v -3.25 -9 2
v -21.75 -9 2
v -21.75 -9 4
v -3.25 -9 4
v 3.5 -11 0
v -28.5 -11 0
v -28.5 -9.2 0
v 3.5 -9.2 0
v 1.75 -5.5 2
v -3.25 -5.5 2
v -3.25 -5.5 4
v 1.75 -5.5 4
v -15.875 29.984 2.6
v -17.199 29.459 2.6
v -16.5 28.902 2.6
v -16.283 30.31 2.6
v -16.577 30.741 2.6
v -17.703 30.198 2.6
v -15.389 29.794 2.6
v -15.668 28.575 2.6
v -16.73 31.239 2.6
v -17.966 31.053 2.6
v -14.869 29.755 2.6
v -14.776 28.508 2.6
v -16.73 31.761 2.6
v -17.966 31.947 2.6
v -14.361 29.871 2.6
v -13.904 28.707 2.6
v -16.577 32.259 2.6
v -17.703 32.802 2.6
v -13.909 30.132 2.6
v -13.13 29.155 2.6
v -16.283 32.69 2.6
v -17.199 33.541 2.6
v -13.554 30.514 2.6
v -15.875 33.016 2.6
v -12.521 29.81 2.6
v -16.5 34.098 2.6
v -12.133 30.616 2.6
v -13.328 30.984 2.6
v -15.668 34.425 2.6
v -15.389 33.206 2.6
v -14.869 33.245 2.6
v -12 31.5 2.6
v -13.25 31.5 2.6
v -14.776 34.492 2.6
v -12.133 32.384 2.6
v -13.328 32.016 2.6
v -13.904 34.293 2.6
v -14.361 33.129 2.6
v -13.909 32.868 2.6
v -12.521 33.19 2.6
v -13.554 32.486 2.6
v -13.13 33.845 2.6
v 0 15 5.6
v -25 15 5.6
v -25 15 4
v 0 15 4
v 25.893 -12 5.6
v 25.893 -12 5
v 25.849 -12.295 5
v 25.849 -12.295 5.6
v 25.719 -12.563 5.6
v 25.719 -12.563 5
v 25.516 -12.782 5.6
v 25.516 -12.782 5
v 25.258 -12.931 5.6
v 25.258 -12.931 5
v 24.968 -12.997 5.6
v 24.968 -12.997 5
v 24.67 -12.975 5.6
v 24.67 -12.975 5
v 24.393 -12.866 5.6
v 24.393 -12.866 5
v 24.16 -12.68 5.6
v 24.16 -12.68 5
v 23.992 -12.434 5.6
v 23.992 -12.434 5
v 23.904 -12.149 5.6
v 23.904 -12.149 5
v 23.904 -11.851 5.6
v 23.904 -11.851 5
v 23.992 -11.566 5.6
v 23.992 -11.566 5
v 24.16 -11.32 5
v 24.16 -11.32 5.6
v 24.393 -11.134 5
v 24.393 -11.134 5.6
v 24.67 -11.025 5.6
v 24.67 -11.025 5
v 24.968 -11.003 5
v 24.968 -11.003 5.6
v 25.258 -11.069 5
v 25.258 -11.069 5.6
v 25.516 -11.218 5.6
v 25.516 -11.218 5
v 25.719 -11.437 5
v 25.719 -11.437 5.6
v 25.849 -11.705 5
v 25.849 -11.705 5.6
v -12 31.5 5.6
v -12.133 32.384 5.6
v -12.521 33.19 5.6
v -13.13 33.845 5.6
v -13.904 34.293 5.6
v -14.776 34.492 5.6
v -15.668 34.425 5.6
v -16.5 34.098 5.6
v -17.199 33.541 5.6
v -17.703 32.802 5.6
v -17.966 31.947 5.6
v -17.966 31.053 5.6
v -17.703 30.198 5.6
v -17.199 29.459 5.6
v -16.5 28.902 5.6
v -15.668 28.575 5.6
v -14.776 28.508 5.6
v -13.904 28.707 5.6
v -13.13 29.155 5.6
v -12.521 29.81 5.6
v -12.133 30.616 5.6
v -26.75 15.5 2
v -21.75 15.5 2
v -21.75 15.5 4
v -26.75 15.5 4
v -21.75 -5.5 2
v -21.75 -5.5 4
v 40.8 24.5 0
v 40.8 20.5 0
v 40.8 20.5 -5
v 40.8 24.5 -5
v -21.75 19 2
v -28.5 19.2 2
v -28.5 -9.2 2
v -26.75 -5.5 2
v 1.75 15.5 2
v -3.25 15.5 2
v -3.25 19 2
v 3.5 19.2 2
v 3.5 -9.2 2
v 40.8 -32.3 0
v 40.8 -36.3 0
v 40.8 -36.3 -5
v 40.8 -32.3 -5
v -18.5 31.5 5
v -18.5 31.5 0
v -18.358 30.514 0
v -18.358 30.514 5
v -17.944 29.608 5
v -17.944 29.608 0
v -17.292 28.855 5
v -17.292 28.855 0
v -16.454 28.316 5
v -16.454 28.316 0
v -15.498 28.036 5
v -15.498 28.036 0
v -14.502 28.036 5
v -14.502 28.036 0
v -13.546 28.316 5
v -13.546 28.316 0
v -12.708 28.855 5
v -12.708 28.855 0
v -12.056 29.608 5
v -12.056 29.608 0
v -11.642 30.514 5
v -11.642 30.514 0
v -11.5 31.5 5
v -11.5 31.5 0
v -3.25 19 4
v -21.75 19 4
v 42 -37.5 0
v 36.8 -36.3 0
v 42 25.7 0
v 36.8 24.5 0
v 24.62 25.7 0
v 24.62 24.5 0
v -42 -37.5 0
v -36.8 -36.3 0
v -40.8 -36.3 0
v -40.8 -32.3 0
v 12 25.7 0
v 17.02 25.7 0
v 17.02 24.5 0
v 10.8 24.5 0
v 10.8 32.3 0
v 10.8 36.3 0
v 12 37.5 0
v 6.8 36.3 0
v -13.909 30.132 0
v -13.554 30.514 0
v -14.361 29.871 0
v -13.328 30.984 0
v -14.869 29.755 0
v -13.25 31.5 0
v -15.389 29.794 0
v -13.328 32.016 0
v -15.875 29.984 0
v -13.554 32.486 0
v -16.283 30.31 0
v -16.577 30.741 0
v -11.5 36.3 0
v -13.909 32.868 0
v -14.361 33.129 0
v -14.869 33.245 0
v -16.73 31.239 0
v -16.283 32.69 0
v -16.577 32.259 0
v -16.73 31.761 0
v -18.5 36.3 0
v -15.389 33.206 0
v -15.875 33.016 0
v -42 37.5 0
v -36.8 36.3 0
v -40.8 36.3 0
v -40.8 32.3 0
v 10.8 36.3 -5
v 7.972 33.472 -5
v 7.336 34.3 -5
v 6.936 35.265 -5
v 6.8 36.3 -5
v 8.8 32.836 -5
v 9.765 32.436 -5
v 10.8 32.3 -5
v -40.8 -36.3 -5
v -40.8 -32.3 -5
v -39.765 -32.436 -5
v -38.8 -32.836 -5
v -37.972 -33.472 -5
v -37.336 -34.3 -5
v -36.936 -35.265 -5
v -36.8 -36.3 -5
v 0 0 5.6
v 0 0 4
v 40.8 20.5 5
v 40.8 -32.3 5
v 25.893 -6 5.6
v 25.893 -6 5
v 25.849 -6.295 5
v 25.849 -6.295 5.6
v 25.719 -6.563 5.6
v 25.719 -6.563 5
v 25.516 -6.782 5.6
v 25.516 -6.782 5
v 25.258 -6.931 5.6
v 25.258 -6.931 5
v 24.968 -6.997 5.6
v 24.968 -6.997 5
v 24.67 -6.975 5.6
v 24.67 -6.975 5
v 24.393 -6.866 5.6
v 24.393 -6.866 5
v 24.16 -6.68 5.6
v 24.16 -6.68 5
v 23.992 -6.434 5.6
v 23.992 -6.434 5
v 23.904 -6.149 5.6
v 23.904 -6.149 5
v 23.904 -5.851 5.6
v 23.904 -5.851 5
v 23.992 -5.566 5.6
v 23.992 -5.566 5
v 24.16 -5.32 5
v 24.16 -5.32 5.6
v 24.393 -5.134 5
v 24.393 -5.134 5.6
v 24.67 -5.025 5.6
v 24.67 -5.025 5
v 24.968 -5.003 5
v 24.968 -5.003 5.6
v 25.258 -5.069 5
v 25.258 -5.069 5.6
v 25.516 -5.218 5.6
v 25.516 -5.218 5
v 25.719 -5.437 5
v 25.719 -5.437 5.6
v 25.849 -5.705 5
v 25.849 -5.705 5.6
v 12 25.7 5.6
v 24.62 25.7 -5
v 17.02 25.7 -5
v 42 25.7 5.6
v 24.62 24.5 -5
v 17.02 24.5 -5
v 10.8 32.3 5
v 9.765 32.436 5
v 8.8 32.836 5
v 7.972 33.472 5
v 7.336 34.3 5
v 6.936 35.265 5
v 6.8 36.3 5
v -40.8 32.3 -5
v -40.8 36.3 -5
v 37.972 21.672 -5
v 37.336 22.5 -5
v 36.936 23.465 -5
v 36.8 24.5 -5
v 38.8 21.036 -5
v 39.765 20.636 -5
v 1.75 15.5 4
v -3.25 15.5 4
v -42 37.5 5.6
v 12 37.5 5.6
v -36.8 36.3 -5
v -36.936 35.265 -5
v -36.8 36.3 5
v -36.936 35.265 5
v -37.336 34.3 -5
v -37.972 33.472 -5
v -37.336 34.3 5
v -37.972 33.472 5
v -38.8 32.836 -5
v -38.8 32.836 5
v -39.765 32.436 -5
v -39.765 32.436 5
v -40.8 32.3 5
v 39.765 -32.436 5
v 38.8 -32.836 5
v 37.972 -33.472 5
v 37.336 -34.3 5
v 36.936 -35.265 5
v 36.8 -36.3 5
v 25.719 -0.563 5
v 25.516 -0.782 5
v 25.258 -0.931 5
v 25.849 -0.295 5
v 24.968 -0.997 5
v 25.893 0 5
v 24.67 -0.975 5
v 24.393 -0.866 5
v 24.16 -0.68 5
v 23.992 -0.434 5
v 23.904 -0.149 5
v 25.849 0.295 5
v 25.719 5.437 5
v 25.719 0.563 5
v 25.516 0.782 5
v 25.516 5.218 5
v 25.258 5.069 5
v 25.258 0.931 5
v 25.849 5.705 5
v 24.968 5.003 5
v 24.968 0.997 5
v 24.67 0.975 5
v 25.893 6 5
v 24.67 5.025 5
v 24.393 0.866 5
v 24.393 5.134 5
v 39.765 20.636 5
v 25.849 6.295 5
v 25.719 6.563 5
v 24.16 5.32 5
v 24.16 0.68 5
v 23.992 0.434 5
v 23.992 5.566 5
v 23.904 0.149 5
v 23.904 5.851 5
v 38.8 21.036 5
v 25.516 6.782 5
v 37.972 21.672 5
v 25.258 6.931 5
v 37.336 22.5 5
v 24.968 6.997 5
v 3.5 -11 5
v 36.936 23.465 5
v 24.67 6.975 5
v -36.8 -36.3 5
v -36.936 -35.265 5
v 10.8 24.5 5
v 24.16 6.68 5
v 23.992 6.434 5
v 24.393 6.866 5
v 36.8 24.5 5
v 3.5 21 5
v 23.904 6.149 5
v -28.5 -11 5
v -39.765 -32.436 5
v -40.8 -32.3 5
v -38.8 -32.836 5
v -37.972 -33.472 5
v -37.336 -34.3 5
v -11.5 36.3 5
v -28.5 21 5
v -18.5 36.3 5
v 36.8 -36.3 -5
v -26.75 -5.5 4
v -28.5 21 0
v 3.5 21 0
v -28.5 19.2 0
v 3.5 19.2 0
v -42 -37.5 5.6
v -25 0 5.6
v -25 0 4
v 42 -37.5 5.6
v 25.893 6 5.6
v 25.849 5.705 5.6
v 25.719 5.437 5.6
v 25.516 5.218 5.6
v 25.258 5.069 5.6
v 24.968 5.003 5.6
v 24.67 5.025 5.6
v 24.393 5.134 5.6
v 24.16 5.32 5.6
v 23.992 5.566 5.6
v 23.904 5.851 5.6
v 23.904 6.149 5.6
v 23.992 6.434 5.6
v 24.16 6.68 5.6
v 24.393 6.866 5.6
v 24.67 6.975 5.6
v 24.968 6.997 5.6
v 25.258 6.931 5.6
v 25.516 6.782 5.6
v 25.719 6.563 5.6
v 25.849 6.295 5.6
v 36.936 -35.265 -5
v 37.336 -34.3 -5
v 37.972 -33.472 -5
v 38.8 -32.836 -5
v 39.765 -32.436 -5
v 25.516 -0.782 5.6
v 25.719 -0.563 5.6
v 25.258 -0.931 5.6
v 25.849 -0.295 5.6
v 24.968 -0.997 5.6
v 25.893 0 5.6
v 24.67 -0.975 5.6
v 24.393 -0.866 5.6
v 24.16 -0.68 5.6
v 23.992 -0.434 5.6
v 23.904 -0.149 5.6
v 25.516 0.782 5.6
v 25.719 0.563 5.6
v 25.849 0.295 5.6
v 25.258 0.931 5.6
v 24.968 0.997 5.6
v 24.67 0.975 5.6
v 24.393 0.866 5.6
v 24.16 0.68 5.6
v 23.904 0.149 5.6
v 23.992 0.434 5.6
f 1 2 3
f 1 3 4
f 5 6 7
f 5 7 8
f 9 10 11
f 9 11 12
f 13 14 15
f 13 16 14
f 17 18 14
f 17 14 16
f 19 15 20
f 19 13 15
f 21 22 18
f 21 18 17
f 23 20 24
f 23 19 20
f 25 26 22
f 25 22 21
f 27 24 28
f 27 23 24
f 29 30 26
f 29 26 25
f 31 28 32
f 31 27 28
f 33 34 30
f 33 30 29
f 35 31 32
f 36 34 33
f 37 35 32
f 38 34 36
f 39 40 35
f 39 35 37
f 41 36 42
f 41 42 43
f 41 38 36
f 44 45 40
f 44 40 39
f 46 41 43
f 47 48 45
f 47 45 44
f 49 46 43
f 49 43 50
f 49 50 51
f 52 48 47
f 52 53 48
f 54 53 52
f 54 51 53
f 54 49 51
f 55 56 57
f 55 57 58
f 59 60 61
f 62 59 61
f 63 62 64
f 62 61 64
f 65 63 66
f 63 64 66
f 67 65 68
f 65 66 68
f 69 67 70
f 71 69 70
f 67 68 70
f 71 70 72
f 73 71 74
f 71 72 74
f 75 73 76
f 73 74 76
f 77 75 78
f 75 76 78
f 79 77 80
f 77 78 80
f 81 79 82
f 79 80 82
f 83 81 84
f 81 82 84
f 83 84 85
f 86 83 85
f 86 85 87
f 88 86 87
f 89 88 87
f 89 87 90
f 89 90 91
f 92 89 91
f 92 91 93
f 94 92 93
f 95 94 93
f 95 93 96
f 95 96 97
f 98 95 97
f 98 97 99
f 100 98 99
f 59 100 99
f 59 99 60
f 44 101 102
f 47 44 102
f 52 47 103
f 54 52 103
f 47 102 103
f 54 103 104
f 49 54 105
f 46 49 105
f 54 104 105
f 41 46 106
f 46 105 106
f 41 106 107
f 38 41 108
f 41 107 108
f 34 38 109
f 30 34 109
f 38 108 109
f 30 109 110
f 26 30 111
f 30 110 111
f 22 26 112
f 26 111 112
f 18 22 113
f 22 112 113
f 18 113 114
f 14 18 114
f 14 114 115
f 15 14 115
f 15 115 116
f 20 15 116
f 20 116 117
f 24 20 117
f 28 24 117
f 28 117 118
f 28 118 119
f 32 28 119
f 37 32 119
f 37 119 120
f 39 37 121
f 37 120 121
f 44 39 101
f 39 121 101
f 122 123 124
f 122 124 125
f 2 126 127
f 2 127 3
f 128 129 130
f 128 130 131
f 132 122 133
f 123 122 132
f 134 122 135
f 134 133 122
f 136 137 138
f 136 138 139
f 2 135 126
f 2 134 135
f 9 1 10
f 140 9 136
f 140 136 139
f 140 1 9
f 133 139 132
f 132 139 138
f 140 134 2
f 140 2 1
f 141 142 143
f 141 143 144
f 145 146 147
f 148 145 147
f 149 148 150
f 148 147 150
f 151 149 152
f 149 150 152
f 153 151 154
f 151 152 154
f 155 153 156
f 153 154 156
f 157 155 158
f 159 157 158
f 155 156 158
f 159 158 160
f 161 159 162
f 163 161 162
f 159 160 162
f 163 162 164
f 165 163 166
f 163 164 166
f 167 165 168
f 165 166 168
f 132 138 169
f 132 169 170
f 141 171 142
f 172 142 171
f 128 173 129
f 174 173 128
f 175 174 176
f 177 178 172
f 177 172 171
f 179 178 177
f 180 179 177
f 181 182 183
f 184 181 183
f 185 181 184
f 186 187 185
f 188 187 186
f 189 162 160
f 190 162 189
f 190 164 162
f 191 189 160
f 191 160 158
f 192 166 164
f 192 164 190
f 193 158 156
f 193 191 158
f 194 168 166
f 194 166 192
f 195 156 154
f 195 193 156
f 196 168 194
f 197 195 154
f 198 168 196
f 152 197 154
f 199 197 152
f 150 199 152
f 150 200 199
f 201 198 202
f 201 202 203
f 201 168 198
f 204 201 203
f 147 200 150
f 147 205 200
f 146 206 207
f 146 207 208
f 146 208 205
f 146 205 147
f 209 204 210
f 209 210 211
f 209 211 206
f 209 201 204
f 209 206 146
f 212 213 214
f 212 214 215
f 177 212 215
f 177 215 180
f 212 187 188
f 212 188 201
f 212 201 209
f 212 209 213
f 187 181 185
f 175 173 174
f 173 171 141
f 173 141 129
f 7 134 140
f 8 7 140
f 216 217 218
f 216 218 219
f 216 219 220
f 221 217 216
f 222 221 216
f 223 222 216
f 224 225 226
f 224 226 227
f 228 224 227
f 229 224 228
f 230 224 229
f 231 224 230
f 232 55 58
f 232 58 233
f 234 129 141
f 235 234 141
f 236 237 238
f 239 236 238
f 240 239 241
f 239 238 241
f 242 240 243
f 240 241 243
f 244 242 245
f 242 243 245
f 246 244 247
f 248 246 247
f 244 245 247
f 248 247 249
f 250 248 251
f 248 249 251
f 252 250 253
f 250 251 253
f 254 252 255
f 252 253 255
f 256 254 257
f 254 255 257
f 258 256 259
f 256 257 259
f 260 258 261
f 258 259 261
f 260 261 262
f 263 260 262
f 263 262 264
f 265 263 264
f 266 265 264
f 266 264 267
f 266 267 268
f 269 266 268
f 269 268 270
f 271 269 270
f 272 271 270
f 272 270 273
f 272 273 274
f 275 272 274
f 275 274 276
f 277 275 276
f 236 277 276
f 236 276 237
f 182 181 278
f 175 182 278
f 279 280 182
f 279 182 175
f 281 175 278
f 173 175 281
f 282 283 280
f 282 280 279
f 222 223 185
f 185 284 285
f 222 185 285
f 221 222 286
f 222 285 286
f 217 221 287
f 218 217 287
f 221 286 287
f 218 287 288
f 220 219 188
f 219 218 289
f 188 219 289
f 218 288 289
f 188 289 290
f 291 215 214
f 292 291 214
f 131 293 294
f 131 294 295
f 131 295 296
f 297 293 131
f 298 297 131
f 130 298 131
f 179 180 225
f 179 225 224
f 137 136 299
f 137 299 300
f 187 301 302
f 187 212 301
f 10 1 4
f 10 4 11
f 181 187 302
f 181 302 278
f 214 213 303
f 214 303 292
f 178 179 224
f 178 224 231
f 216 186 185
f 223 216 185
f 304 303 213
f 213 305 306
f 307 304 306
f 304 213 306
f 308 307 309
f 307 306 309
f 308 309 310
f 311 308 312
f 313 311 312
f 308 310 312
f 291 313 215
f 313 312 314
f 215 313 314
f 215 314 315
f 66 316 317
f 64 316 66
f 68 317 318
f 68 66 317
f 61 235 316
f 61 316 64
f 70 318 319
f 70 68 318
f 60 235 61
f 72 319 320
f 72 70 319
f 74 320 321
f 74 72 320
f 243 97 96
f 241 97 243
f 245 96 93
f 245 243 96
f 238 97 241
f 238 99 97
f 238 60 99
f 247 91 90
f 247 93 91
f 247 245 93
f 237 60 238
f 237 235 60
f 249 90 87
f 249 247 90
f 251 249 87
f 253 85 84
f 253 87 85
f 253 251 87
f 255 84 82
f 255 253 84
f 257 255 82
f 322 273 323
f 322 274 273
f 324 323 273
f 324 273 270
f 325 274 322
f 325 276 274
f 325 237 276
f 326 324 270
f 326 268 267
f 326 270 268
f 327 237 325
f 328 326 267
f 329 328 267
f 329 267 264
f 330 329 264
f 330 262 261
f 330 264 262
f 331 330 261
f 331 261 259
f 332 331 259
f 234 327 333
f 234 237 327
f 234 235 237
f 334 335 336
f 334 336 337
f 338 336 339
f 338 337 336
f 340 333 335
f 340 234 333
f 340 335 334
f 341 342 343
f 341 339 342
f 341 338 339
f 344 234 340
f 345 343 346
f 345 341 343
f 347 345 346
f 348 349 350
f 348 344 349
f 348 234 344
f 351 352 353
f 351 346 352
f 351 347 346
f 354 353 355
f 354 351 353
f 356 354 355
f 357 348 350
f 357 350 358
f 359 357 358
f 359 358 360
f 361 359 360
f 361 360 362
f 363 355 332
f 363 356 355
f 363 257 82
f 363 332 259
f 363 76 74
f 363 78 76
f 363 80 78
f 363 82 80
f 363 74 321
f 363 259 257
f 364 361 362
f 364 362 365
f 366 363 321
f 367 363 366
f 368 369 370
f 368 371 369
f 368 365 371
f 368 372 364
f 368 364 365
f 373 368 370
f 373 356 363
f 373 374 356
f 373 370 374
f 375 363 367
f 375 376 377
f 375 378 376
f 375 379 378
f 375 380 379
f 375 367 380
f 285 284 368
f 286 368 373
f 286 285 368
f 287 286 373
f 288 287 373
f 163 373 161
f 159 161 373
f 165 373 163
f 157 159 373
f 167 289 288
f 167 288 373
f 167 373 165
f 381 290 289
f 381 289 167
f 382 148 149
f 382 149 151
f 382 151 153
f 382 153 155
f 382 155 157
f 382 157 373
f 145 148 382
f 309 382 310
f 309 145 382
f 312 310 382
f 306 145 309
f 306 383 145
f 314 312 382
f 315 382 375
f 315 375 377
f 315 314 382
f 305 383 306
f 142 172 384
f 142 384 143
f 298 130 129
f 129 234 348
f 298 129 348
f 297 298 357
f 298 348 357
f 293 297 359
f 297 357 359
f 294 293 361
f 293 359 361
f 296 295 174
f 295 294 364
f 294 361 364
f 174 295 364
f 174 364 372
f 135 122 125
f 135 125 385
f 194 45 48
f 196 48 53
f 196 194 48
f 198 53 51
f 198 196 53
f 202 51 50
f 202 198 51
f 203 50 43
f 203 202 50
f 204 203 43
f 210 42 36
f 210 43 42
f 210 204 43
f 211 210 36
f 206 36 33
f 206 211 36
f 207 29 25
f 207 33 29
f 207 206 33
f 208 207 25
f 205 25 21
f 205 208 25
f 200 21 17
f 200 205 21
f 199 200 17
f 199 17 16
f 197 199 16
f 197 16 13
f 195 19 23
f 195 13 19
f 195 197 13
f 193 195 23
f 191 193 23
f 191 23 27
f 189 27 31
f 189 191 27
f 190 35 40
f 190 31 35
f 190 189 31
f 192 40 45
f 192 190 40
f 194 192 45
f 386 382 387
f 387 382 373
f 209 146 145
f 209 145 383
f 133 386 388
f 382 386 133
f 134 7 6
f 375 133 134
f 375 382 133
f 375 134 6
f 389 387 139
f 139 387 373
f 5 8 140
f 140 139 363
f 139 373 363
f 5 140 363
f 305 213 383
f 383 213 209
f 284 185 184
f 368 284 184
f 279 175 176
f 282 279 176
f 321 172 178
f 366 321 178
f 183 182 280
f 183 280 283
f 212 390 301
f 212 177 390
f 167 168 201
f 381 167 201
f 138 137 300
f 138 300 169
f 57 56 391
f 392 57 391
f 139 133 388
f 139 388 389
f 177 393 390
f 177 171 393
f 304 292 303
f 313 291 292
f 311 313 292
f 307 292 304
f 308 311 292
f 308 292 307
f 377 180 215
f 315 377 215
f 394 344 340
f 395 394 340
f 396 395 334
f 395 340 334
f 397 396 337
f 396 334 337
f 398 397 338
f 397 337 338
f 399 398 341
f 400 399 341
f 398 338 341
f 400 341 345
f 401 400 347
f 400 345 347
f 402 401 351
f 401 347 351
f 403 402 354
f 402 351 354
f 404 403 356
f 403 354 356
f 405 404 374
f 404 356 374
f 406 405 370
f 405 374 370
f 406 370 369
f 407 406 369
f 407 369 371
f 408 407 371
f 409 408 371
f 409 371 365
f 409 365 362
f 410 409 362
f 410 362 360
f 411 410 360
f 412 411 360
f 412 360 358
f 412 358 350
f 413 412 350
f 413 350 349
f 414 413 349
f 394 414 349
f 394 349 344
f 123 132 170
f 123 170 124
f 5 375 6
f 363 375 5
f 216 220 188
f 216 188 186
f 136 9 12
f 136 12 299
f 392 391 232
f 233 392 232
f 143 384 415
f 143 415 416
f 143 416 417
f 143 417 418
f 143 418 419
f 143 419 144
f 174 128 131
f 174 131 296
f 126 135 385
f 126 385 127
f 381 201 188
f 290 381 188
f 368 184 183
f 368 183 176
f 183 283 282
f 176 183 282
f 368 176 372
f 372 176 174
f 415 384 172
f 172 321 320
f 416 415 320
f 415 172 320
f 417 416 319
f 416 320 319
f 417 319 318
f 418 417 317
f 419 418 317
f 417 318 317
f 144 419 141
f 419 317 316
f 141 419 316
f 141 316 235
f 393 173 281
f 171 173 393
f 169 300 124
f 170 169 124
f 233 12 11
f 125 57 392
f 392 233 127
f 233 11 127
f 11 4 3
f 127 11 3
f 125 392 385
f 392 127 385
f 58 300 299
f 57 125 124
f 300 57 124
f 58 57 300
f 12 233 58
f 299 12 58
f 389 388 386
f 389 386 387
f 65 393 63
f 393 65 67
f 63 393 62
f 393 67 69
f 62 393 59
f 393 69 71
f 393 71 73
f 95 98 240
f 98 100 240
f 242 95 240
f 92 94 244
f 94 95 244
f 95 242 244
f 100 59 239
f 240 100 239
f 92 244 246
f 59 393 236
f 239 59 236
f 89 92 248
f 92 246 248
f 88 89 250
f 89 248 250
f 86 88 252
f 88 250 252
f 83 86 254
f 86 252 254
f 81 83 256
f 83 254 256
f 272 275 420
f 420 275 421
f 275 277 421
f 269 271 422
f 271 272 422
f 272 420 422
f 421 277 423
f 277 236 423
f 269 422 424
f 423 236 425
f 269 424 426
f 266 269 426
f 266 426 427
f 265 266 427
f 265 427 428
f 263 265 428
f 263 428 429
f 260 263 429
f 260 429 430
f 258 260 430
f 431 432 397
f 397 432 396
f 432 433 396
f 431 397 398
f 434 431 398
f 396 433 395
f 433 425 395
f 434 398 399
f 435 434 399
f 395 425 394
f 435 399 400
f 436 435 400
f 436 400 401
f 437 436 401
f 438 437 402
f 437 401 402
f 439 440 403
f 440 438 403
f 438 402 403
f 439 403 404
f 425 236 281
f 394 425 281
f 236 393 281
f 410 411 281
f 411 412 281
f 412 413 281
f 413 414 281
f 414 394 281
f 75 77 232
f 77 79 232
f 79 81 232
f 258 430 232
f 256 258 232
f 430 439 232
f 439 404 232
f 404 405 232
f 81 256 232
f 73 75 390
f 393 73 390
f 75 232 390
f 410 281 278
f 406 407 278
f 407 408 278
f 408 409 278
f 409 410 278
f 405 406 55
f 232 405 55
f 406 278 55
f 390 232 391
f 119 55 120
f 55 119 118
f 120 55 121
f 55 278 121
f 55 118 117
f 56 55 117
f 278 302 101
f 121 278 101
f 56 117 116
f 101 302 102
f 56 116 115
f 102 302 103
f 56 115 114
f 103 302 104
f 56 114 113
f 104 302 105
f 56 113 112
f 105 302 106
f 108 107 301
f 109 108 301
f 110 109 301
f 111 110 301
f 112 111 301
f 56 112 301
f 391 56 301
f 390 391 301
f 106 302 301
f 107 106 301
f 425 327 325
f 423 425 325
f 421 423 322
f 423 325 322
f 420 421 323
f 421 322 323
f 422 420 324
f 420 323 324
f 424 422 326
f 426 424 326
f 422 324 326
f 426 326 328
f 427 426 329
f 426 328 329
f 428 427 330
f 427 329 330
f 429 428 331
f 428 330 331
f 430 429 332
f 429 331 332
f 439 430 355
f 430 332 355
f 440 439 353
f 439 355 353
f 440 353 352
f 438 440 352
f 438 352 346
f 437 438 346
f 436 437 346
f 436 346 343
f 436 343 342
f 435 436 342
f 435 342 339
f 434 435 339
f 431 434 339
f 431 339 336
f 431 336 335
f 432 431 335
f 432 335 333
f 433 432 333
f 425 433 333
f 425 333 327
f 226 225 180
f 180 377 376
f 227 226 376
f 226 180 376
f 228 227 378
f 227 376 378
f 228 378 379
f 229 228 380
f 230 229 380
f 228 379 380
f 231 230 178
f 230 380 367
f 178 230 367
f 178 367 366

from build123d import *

# Parameters (mm, degrees)
SKETCH058_R     = 1.75
PAD036_DEPTH    = 5
SKETCH059_R     = 1.75
PAD037_DEPTH    = 0.6
SKETCH060_R     = 3
POCKET018_DEPTH = 3
SKETCH064_W     = 25
SKETCH064_H     = 15
POCKET020_DEPTH = 5
SKETCH065_W     = 32
SKETCH065_H     = 32
SKETCH065_W_2   = 25
SKETCH065_H_2   = 15
PAD040_DEPTH    = 3
POCKET021_DEPTH = 2
SKETCH067_W     = 32
SKETCH067_H     = 1.8
PAD041_DEPTH    = 2
SKETCH069_W     = 7.6
SKETCH069_H     = 1.2
PAD042_DEPTH    = 5
SKETCH070_R     = 1
POCKET022_DEPTH = 0.601
PAD043_DEPTH    = 10


with BuildPart() as part:
    # Sketch058 → Pad036 (new body)
    with BuildSketch(Plane.XY):
        Polygon((-42, 37.5), (12, 37.5), (12, 25.7), (42, 25.7), (42, -37.5), (-42, -37.5), align=None)
        with Locations((-15, 31.5)):
            Circle(SKETCH058_R, mode=Mode.SUBTRACT)
        with BuildLine():
            ThreePointArc((-18.5, 31.5), (-15, 28), (-11.5, 31.5))
            Line((-11.5, 31.5), (-11.5, 36.3))
            Line((-11.5, 36.3), (10.8, 36.3))
            Line((10.8, 36.3), (10.8, 24.5))
            Line((10.8, 24.5), (40.8, 24.5))
            Line((40.8, 24.5), (40.8, -36.3))
            Line((40.8, -36.3), (-40.8, -36.3))
            Line((-40.8, -36.3), (-40.8, 36.3))
            Line((-40.8, 36.3), (-18.5, 36.3))
            Line((-18.5, 31.5), (-18.5, 36.3))
        make_face(mode=Mode.SUBTRACT)
    extrude(amount=PAD036_DEPTH)

    # Sketch059 (on Face19 of Pad036) → Pad037 (join)
    with BuildSketch(Plane.XY.offset(5)):
        Polygon((-42, 37.5), (12, 37.5), (12, 25.7), (42, 25.7), (42, -37.5), (-42, -37.5), align=None)
        with Locations((-15, 31.5)):
            Circle(SKETCH059_R, mode=Mode.SUBTRACT)
    extrude(amount=PAD037_DEPTH)

    # Sketch060 (on Face1 of Pad037) → Pocket018 (cut)
    with BuildSketch(Plane.XY.offset(5.6)):
        with Locations((-15, 31.5)):
            Circle(SKETCH060_R)
    extrude(amount=-POCKET018_DEPTH, mode=Mode.SUBTRACT)

    # Sketch064 → Pocket020 (cut)
    with BuildSketch(Plane(origin=(0, 0, 5), x_dir=(1, 0, 0), z_dir=(0, 0, -1))):
        with Locations((-12.5, -7.5)):
            Rectangle(SKETCH064_W, SKETCH064_H)
    extrude(amount=-POCKET020_DEPTH, mode=Mode.SUBTRACT)

    # Sketch065 (on Face14 of Pocket020) → Pad040 (join)
    with BuildSketch(Plane(origin=(0, 0, 5), x_dir=(1, 0, 0), z_dir=(0, 0, -1))):
        with Locations((-12.5, -5)):
            Rectangle(SKETCH065_W, SKETCH065_H)
        with Locations((-12.5, -7.5)):
            Rectangle(SKETCH065_W_2, SKETCH065_H_2, mode=Mode.SUBTRACT)
    extrude(amount=PAD040_DEPTH)

    # Sketch066 (on Face24 of Pad040) → Pocket021 (cut)
    with BuildSketch(Plane(origin=(0, 0, 2), x_dir=(1, 0, 0), z_dir=(0, 0, -1))):
        Polygon((-26.75, -15.5), (-26.75, 5.5), (-21.75, 5.5), (-21.75, 9), (-3.25, 9), (-3.25, 5.5), (1.75, 5.5), (1.75, -15.5), (-3.25, -15.5), (-3.25, -19), (-21.75, -19), (-21.75, -15.5), align=None)
    extrude(amount=-POCKET021_DEPTH, mode=Mode.SUBTRACT)

    # Sketch067 (on Face40 of Pocket021) → Pad041 (join)
    with BuildSketch(Plane(origin=(0, 0, 2), x_dir=(1, 0, 0), z_dir=(0, 0, -1))):
        with Locations((-12.5, 10.1)):
            Rectangle(SKETCH067_W, SKETCH067_H)
        with Locations((-12.5, -20.1)):
            Rectangle(SKETCH067_W, SKETCH067_H)
    extrude(amount=PAD041_DEPTH)

    # Sketch069 (on Face13 of Pad041) → Pad042 (join)
    with BuildSketch(Plane(origin=(0, 0, 0), x_dir=(1, 0, 0), z_dir=(0, 0, -1))):
        with Locations((20.82, -25.1)):
            Rectangle(SKETCH069_W, SKETCH069_H)
    extrude(amount=PAD042_DEPTH)

    # Sketch070 (on Face40 of Pad042) → Pocket022 (cut, through all)
    with BuildSketch(Plane(origin=(0, 0, 5), x_dir=(1, 0, 0), z_dir=(0, 0, -1))):
        with Locations((24.892975, 0)):
            Circle(SKETCH070_R)
        with Locations((24.892975, -6)):
            Circle(SKETCH070_R)
        with Locations((24.892975, 6)):
            Circle(SKETCH070_R)
        with Locations((24.892975, 12)):
            Circle(SKETCH070_R)
    extrude(amount=-POCKET022_DEPTH, mode=Mode.SUBTRACT)

    # Sketch071 (on Face22 of Pocket022) → Pad043 (join)
    with BuildSketch(Plane(origin=(0, 0, 5), x_dir=(1, 0, 0), z_dir=(0, 0, -1))):
        with BuildLine():
            ThreePointArc((10.8, -32.3), (7.971573, -33.471573), (6.8, -36.3))
            Line((6.8, -36.3), (10.8, -36.3))
            Line((10.8, -36.3), (10.8, -32.3))
        make_face()
        with BuildLine():
            ThreePointArc((40.8, -20.5), (37.971573, -21.671573), (36.8, -24.5))
            Line((40.8, -24.5), (36.8, -24.5))
            Line((40.8, -20.5), (40.8, -24.5))
        make_face()
        with BuildLine():
            ThreePointArc((36.8, 36.3), (37.971573, 33.471573), (40.8, 32.3))
            Line((40.8, 36.3), (40.8, 32.3))
            Line((36.8, 36.3), (40.8, 36.3))
        make_face()
        with BuildLine():
            ThreePointArc((-40.8, 32.3), (-37.971573, 33.471573), (-36.8, 36.3))
            Line((-40.8, 36.3), (-36.8, 36.3))
            Line((-40.8, 32.3), (-40.8, 36.3))
        make_face()
        with BuildLine():
            ThreePointArc((-36.8, -36.3), (-37.971573, -33.471573), (-40.8, -32.3))
            Line((-40.8, -32.3), (-40.8, -36.3))
            Line((-36.8, -36.3), (-40.8, -36.3))
        make_face()
    extrude(amount=PAD043_DEPTH)


solid = part.part
